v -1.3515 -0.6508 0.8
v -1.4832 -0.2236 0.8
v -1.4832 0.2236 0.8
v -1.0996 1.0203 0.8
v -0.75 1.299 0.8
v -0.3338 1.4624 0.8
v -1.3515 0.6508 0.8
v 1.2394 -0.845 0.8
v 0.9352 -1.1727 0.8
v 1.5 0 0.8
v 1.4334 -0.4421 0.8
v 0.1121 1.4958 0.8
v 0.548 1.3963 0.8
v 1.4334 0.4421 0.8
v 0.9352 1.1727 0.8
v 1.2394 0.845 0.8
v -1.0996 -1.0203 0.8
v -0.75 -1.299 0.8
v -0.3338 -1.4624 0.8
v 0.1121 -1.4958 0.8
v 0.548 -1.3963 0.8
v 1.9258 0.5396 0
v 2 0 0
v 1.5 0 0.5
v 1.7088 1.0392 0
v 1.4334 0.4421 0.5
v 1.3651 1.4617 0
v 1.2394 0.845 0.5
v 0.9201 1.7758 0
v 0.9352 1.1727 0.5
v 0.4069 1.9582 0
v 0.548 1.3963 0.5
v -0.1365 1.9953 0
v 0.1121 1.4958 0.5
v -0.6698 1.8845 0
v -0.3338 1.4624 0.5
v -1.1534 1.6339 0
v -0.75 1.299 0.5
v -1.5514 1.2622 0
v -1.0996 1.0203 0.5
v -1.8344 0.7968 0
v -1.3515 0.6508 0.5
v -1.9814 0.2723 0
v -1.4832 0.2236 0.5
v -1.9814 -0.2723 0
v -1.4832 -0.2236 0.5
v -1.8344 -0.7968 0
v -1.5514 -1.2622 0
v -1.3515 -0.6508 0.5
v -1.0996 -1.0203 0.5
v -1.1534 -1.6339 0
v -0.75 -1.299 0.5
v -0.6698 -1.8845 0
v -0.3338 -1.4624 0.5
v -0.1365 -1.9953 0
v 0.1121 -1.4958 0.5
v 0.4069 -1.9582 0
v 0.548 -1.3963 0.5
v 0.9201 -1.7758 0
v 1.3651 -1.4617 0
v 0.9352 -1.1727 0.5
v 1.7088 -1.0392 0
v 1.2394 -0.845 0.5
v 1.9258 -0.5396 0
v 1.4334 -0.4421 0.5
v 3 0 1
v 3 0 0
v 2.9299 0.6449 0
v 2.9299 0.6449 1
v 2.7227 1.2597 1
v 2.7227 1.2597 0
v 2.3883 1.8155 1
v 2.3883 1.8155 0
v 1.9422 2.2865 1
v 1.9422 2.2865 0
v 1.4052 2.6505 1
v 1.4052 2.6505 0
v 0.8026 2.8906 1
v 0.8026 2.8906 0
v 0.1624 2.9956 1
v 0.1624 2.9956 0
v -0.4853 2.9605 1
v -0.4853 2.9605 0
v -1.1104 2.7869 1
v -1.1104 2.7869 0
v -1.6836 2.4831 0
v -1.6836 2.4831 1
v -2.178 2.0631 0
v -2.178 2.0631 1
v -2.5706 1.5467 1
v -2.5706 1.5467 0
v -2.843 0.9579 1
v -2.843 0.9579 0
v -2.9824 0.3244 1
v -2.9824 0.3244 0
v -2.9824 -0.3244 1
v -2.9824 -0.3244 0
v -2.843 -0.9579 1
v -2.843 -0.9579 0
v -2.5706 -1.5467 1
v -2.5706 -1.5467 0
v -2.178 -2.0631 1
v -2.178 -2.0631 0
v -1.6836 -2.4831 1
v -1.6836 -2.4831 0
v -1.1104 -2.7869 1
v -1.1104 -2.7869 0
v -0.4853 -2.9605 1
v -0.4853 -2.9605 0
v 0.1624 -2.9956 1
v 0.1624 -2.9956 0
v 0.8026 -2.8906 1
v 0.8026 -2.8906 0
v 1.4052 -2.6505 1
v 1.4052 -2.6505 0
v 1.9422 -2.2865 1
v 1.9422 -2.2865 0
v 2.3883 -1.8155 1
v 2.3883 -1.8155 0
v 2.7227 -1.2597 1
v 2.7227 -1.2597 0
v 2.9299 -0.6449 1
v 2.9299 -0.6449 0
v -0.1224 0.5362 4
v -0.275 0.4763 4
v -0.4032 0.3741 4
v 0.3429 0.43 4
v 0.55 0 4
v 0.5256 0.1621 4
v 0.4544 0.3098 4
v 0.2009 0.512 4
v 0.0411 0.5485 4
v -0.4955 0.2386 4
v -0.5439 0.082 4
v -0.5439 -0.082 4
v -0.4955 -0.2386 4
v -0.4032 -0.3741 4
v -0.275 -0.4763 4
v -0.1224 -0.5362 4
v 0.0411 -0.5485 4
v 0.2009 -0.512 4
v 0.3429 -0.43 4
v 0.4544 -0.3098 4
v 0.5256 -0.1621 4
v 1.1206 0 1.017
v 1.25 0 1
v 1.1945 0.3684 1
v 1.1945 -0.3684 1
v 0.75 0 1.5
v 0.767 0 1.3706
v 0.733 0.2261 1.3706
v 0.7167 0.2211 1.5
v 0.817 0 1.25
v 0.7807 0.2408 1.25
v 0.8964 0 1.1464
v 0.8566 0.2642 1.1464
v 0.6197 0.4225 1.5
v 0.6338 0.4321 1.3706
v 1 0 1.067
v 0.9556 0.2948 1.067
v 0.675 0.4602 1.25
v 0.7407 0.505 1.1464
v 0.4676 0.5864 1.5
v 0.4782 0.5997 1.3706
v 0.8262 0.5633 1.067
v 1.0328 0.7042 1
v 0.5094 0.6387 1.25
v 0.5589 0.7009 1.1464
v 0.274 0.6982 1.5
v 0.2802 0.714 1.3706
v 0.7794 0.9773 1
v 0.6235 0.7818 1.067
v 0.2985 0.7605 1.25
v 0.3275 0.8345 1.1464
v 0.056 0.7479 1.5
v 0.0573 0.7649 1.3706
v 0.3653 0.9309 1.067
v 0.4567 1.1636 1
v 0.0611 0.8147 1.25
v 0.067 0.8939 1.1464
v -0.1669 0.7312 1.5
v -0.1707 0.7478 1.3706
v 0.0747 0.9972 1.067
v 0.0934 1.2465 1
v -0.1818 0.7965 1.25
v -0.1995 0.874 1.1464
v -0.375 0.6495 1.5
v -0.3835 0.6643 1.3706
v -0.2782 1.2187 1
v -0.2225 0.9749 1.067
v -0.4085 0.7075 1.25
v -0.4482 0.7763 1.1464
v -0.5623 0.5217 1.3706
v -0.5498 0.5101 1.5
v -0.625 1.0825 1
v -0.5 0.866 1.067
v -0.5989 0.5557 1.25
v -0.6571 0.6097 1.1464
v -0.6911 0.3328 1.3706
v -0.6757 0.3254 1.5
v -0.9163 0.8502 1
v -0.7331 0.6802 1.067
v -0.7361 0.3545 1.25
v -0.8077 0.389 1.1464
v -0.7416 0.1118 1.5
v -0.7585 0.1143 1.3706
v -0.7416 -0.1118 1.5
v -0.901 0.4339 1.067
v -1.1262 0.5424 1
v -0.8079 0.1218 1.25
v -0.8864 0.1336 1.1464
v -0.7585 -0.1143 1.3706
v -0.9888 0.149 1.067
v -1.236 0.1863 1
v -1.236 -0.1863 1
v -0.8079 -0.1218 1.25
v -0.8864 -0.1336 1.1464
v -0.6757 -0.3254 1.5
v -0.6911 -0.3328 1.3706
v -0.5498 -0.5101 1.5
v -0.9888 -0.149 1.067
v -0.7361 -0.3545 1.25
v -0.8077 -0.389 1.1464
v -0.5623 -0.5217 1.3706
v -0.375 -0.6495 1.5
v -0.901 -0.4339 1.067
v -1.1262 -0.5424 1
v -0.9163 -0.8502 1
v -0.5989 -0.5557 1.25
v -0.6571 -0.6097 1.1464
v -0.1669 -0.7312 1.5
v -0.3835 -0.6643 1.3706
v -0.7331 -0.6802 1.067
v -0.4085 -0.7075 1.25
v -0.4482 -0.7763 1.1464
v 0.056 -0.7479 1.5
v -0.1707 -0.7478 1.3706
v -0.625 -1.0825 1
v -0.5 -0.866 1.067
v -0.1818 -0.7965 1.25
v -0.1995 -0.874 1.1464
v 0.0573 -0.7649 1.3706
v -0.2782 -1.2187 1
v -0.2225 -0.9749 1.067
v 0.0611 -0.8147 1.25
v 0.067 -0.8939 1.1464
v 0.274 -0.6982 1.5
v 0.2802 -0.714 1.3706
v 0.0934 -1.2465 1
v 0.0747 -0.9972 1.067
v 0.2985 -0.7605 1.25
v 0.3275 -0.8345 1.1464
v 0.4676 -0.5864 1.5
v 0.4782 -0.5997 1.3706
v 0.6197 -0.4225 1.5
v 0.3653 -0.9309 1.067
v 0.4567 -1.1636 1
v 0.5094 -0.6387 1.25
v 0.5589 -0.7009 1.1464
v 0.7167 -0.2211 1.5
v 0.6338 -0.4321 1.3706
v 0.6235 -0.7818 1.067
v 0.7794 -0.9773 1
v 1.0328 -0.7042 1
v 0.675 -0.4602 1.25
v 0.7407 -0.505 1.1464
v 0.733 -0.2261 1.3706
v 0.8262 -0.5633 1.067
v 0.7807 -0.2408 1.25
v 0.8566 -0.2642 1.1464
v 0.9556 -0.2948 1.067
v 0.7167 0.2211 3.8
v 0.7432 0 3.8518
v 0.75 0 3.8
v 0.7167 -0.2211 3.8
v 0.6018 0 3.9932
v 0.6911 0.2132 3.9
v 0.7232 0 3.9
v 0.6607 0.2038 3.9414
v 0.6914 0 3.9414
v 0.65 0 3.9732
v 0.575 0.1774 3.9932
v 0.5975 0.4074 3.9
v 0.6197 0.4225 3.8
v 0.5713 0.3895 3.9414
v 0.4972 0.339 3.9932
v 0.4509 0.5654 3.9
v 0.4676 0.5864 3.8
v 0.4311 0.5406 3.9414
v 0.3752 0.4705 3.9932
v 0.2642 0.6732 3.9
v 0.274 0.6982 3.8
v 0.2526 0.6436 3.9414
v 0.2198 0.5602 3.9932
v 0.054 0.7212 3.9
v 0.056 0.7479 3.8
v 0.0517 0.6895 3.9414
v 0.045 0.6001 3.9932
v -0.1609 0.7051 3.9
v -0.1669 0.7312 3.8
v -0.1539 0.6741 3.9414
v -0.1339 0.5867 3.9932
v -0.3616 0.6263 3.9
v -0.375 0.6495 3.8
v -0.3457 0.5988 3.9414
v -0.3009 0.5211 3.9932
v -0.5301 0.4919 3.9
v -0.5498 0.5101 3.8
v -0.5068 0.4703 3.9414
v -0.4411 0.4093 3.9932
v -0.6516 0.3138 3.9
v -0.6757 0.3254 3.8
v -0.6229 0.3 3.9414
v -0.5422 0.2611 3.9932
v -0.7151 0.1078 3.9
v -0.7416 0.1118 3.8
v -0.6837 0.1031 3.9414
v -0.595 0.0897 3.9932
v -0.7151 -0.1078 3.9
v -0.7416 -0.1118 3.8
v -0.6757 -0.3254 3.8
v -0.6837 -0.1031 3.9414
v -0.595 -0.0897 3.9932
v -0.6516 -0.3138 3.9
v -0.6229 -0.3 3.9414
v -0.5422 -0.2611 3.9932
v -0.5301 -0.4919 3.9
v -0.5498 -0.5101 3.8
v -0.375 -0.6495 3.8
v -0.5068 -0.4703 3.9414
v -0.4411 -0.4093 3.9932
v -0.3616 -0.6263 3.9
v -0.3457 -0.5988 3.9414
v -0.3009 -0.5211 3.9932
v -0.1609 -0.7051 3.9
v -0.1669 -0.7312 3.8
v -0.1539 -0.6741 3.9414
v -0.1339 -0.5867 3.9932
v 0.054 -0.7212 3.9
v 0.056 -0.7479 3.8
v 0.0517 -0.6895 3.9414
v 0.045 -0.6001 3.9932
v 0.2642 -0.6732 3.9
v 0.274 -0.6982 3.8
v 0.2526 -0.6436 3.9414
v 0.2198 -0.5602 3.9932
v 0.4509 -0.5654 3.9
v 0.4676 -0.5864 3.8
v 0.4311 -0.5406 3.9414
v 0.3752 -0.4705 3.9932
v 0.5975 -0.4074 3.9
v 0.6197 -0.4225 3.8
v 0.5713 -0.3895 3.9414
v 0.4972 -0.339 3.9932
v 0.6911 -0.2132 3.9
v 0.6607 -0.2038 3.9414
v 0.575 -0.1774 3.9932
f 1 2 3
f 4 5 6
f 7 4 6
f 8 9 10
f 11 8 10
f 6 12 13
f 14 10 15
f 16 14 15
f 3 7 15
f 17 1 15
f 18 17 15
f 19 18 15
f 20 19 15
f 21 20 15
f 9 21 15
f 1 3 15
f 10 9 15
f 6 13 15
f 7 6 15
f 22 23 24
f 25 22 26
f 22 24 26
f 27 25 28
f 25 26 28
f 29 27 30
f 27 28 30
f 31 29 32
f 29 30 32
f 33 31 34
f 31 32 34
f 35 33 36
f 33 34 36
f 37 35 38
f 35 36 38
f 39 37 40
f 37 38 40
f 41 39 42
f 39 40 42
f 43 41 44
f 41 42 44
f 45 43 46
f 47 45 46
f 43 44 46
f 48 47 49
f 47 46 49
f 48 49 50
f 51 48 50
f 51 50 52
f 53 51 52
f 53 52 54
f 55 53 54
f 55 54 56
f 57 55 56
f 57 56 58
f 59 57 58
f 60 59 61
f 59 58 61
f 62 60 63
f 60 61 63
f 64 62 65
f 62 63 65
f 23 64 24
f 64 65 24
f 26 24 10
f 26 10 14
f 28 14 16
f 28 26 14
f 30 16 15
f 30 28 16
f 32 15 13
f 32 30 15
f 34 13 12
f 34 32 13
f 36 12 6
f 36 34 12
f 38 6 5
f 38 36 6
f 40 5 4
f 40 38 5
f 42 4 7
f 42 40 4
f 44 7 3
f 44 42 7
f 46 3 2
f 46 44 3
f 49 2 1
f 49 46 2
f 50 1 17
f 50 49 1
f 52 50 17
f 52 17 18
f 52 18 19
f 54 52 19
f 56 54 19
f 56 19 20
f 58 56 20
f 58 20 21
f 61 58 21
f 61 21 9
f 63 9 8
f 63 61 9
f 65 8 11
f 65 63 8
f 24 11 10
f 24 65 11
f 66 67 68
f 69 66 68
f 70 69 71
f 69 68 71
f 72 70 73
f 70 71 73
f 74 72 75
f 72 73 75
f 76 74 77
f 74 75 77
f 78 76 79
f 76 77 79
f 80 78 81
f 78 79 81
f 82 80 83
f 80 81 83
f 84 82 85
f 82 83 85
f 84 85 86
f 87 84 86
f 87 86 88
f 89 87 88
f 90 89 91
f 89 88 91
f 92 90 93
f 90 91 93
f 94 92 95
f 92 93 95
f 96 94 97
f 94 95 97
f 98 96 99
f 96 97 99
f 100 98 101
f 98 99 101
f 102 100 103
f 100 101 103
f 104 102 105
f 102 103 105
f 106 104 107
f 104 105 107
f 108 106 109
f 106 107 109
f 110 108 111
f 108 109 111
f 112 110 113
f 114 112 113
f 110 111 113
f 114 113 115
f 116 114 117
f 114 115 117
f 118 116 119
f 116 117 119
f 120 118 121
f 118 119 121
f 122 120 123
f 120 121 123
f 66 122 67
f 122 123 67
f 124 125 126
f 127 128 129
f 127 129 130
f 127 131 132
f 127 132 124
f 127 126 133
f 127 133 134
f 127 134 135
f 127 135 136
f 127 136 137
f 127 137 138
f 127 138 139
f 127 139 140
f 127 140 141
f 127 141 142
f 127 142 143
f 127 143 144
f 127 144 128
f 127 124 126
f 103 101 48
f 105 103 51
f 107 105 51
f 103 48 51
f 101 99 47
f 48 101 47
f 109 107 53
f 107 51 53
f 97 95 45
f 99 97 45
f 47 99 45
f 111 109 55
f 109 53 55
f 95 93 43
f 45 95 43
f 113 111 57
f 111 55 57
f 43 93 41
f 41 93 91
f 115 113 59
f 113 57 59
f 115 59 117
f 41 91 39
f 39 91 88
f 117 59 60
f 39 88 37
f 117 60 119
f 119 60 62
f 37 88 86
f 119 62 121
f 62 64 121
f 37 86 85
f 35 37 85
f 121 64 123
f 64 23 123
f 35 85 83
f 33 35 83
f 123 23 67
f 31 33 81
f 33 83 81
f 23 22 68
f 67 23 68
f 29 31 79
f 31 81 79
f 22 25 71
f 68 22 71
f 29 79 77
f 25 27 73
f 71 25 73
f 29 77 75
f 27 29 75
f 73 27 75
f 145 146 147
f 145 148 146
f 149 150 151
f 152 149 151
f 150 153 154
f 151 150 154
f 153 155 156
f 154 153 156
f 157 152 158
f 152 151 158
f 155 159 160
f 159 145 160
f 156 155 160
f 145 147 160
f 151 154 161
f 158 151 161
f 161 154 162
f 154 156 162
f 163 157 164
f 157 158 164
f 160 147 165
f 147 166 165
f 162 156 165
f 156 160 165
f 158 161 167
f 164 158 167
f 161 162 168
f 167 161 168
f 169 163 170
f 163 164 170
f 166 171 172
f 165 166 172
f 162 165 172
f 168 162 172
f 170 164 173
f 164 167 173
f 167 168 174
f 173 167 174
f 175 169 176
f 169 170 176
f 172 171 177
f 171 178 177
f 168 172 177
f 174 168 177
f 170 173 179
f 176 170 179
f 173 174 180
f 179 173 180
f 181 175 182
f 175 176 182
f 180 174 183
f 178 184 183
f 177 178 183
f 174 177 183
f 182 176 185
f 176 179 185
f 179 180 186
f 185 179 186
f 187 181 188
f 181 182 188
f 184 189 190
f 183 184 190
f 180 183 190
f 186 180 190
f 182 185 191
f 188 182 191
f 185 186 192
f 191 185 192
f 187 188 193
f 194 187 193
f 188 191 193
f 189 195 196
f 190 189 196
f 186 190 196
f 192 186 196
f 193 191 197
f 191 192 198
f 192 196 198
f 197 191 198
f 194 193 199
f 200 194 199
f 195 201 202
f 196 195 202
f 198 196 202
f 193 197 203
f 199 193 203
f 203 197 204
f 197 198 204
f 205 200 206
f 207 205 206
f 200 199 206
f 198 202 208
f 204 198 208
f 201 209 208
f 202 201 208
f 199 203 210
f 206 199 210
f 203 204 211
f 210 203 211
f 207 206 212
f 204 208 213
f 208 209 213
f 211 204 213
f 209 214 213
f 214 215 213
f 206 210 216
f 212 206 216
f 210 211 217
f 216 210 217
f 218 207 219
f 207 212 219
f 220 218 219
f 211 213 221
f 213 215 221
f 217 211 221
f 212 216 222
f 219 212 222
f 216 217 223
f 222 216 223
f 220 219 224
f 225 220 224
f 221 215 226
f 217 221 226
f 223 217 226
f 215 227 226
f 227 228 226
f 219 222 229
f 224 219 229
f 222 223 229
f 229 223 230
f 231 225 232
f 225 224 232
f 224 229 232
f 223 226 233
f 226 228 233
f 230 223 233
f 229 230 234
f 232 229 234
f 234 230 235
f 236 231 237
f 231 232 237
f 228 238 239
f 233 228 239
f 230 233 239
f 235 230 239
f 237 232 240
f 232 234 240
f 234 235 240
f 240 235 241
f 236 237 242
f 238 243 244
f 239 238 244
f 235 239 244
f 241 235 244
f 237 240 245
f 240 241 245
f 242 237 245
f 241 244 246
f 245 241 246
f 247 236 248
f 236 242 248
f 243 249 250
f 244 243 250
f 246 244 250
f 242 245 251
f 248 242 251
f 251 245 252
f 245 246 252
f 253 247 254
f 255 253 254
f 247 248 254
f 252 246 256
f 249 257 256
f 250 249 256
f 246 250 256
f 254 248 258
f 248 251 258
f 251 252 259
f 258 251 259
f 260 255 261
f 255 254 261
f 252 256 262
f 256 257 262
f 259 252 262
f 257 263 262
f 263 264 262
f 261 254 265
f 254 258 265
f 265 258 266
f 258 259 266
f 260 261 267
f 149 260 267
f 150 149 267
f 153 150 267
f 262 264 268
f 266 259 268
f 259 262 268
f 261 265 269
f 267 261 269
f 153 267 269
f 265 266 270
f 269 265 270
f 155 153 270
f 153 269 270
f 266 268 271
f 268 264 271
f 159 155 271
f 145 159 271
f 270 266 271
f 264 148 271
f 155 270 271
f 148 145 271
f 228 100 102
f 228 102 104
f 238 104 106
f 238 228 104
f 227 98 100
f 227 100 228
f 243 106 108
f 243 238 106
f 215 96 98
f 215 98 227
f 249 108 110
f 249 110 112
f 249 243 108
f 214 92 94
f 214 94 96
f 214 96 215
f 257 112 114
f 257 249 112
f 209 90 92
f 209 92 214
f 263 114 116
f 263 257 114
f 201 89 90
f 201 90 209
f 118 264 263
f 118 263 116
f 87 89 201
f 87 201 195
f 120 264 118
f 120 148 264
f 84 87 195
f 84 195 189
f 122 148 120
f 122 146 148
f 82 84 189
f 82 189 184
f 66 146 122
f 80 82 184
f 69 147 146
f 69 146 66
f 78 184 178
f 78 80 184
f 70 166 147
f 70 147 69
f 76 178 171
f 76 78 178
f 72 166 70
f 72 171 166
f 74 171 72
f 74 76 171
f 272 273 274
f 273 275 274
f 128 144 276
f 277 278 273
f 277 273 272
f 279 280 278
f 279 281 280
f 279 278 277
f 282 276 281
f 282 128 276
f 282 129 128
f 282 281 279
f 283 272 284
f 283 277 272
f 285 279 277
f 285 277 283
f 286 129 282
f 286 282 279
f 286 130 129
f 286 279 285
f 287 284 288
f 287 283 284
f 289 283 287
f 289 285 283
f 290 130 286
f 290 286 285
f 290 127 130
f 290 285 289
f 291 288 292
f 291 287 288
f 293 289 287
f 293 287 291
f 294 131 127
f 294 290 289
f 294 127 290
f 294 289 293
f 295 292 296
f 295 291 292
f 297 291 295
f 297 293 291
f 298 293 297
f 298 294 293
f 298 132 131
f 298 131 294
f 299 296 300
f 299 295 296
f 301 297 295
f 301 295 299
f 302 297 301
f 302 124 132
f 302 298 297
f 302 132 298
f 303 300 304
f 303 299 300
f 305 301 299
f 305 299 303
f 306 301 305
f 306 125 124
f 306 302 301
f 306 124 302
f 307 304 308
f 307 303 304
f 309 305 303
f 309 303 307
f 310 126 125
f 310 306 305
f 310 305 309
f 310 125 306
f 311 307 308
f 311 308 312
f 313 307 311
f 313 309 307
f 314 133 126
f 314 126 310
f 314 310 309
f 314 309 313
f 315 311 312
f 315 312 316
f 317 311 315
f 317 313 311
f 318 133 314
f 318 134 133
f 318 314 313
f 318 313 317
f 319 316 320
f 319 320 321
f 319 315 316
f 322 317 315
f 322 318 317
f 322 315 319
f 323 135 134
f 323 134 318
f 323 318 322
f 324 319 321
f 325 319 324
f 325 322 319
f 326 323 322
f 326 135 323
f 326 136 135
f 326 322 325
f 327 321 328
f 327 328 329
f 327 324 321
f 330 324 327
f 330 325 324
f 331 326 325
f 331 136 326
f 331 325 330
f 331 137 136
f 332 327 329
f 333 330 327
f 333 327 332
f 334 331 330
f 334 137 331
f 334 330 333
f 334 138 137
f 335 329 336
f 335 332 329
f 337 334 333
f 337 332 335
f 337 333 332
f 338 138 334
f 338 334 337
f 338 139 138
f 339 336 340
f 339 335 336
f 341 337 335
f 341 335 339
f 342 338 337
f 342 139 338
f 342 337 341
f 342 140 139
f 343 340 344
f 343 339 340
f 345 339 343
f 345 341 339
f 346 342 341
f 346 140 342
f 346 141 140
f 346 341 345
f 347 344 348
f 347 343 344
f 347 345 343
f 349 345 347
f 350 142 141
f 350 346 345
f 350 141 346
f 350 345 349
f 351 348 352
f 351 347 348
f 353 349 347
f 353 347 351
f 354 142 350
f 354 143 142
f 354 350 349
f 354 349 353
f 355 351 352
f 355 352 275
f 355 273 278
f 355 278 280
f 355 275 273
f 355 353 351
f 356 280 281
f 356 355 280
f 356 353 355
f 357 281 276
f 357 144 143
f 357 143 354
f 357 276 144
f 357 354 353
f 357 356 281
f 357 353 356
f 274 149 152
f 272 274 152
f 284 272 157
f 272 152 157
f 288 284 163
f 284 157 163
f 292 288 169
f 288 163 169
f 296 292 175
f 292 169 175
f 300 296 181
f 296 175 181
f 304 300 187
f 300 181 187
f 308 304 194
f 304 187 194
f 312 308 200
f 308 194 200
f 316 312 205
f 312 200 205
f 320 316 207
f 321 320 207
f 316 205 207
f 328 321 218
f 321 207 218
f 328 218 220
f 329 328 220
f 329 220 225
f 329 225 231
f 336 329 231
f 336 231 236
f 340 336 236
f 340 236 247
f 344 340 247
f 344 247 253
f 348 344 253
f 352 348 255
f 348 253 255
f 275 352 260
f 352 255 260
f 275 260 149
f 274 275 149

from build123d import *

# Parameters (mm, degrees)
SKETCH_R     = 3
PAD_DEPTH    = 1
SKETCH001_R  = 0.75
PAD001_DEPTH = 3
SKETCH002_R  = 1.5
POCKET_DEPTH = 0.8
FILLET_R     = 0.2
FILLET001_R  = 0.5
CHAMFER_SIZE = 0.5


with BuildPart() as part:
    # Sketch → Pad (new body)
    with BuildSketch(Plane.XY):
        Circle(SKETCH_R)
    extrude(amount=PAD_DEPTH)

    # Sketch001 (on Face3 of Pad) → Pad001 (join)
    with BuildSketch(Plane.XY.offset(1)):
        Circle(SKETCH001_R)
    extrude(amount=PAD001_DEPTH)

    # Sketch002 → Pocket (cut)
    with BuildSketch(Plane.XY):
        Circle(SKETCH002_R)
    extrude(amount=POCKET_DEPTH, mode=Mode.SUBTRACT)

    # Fillet
    fillet_edges = [part.edges().sort_by_distance(p)[0] for p in [
        (-0.75, 0, 4),
    ]]
    fillet(fillet_edges, radius=FILLET_R)

    # Fillet001
    fillet001_edges = [part.edges().sort_by_distance(p)[0] for p in [
        (-0.75, 0, 1),
    ]]
    fillet(fillet001_edges, radius=FILLET001_R)

    # Chamfer
    chamfer_edges = [part.edges().sort_by_distance(p)[0] for p in [
        (-1.5, 0, 0),
    ]]
    chamfer(chamfer_edges, length=CHAMFER_SIZE)


solid = part.part
